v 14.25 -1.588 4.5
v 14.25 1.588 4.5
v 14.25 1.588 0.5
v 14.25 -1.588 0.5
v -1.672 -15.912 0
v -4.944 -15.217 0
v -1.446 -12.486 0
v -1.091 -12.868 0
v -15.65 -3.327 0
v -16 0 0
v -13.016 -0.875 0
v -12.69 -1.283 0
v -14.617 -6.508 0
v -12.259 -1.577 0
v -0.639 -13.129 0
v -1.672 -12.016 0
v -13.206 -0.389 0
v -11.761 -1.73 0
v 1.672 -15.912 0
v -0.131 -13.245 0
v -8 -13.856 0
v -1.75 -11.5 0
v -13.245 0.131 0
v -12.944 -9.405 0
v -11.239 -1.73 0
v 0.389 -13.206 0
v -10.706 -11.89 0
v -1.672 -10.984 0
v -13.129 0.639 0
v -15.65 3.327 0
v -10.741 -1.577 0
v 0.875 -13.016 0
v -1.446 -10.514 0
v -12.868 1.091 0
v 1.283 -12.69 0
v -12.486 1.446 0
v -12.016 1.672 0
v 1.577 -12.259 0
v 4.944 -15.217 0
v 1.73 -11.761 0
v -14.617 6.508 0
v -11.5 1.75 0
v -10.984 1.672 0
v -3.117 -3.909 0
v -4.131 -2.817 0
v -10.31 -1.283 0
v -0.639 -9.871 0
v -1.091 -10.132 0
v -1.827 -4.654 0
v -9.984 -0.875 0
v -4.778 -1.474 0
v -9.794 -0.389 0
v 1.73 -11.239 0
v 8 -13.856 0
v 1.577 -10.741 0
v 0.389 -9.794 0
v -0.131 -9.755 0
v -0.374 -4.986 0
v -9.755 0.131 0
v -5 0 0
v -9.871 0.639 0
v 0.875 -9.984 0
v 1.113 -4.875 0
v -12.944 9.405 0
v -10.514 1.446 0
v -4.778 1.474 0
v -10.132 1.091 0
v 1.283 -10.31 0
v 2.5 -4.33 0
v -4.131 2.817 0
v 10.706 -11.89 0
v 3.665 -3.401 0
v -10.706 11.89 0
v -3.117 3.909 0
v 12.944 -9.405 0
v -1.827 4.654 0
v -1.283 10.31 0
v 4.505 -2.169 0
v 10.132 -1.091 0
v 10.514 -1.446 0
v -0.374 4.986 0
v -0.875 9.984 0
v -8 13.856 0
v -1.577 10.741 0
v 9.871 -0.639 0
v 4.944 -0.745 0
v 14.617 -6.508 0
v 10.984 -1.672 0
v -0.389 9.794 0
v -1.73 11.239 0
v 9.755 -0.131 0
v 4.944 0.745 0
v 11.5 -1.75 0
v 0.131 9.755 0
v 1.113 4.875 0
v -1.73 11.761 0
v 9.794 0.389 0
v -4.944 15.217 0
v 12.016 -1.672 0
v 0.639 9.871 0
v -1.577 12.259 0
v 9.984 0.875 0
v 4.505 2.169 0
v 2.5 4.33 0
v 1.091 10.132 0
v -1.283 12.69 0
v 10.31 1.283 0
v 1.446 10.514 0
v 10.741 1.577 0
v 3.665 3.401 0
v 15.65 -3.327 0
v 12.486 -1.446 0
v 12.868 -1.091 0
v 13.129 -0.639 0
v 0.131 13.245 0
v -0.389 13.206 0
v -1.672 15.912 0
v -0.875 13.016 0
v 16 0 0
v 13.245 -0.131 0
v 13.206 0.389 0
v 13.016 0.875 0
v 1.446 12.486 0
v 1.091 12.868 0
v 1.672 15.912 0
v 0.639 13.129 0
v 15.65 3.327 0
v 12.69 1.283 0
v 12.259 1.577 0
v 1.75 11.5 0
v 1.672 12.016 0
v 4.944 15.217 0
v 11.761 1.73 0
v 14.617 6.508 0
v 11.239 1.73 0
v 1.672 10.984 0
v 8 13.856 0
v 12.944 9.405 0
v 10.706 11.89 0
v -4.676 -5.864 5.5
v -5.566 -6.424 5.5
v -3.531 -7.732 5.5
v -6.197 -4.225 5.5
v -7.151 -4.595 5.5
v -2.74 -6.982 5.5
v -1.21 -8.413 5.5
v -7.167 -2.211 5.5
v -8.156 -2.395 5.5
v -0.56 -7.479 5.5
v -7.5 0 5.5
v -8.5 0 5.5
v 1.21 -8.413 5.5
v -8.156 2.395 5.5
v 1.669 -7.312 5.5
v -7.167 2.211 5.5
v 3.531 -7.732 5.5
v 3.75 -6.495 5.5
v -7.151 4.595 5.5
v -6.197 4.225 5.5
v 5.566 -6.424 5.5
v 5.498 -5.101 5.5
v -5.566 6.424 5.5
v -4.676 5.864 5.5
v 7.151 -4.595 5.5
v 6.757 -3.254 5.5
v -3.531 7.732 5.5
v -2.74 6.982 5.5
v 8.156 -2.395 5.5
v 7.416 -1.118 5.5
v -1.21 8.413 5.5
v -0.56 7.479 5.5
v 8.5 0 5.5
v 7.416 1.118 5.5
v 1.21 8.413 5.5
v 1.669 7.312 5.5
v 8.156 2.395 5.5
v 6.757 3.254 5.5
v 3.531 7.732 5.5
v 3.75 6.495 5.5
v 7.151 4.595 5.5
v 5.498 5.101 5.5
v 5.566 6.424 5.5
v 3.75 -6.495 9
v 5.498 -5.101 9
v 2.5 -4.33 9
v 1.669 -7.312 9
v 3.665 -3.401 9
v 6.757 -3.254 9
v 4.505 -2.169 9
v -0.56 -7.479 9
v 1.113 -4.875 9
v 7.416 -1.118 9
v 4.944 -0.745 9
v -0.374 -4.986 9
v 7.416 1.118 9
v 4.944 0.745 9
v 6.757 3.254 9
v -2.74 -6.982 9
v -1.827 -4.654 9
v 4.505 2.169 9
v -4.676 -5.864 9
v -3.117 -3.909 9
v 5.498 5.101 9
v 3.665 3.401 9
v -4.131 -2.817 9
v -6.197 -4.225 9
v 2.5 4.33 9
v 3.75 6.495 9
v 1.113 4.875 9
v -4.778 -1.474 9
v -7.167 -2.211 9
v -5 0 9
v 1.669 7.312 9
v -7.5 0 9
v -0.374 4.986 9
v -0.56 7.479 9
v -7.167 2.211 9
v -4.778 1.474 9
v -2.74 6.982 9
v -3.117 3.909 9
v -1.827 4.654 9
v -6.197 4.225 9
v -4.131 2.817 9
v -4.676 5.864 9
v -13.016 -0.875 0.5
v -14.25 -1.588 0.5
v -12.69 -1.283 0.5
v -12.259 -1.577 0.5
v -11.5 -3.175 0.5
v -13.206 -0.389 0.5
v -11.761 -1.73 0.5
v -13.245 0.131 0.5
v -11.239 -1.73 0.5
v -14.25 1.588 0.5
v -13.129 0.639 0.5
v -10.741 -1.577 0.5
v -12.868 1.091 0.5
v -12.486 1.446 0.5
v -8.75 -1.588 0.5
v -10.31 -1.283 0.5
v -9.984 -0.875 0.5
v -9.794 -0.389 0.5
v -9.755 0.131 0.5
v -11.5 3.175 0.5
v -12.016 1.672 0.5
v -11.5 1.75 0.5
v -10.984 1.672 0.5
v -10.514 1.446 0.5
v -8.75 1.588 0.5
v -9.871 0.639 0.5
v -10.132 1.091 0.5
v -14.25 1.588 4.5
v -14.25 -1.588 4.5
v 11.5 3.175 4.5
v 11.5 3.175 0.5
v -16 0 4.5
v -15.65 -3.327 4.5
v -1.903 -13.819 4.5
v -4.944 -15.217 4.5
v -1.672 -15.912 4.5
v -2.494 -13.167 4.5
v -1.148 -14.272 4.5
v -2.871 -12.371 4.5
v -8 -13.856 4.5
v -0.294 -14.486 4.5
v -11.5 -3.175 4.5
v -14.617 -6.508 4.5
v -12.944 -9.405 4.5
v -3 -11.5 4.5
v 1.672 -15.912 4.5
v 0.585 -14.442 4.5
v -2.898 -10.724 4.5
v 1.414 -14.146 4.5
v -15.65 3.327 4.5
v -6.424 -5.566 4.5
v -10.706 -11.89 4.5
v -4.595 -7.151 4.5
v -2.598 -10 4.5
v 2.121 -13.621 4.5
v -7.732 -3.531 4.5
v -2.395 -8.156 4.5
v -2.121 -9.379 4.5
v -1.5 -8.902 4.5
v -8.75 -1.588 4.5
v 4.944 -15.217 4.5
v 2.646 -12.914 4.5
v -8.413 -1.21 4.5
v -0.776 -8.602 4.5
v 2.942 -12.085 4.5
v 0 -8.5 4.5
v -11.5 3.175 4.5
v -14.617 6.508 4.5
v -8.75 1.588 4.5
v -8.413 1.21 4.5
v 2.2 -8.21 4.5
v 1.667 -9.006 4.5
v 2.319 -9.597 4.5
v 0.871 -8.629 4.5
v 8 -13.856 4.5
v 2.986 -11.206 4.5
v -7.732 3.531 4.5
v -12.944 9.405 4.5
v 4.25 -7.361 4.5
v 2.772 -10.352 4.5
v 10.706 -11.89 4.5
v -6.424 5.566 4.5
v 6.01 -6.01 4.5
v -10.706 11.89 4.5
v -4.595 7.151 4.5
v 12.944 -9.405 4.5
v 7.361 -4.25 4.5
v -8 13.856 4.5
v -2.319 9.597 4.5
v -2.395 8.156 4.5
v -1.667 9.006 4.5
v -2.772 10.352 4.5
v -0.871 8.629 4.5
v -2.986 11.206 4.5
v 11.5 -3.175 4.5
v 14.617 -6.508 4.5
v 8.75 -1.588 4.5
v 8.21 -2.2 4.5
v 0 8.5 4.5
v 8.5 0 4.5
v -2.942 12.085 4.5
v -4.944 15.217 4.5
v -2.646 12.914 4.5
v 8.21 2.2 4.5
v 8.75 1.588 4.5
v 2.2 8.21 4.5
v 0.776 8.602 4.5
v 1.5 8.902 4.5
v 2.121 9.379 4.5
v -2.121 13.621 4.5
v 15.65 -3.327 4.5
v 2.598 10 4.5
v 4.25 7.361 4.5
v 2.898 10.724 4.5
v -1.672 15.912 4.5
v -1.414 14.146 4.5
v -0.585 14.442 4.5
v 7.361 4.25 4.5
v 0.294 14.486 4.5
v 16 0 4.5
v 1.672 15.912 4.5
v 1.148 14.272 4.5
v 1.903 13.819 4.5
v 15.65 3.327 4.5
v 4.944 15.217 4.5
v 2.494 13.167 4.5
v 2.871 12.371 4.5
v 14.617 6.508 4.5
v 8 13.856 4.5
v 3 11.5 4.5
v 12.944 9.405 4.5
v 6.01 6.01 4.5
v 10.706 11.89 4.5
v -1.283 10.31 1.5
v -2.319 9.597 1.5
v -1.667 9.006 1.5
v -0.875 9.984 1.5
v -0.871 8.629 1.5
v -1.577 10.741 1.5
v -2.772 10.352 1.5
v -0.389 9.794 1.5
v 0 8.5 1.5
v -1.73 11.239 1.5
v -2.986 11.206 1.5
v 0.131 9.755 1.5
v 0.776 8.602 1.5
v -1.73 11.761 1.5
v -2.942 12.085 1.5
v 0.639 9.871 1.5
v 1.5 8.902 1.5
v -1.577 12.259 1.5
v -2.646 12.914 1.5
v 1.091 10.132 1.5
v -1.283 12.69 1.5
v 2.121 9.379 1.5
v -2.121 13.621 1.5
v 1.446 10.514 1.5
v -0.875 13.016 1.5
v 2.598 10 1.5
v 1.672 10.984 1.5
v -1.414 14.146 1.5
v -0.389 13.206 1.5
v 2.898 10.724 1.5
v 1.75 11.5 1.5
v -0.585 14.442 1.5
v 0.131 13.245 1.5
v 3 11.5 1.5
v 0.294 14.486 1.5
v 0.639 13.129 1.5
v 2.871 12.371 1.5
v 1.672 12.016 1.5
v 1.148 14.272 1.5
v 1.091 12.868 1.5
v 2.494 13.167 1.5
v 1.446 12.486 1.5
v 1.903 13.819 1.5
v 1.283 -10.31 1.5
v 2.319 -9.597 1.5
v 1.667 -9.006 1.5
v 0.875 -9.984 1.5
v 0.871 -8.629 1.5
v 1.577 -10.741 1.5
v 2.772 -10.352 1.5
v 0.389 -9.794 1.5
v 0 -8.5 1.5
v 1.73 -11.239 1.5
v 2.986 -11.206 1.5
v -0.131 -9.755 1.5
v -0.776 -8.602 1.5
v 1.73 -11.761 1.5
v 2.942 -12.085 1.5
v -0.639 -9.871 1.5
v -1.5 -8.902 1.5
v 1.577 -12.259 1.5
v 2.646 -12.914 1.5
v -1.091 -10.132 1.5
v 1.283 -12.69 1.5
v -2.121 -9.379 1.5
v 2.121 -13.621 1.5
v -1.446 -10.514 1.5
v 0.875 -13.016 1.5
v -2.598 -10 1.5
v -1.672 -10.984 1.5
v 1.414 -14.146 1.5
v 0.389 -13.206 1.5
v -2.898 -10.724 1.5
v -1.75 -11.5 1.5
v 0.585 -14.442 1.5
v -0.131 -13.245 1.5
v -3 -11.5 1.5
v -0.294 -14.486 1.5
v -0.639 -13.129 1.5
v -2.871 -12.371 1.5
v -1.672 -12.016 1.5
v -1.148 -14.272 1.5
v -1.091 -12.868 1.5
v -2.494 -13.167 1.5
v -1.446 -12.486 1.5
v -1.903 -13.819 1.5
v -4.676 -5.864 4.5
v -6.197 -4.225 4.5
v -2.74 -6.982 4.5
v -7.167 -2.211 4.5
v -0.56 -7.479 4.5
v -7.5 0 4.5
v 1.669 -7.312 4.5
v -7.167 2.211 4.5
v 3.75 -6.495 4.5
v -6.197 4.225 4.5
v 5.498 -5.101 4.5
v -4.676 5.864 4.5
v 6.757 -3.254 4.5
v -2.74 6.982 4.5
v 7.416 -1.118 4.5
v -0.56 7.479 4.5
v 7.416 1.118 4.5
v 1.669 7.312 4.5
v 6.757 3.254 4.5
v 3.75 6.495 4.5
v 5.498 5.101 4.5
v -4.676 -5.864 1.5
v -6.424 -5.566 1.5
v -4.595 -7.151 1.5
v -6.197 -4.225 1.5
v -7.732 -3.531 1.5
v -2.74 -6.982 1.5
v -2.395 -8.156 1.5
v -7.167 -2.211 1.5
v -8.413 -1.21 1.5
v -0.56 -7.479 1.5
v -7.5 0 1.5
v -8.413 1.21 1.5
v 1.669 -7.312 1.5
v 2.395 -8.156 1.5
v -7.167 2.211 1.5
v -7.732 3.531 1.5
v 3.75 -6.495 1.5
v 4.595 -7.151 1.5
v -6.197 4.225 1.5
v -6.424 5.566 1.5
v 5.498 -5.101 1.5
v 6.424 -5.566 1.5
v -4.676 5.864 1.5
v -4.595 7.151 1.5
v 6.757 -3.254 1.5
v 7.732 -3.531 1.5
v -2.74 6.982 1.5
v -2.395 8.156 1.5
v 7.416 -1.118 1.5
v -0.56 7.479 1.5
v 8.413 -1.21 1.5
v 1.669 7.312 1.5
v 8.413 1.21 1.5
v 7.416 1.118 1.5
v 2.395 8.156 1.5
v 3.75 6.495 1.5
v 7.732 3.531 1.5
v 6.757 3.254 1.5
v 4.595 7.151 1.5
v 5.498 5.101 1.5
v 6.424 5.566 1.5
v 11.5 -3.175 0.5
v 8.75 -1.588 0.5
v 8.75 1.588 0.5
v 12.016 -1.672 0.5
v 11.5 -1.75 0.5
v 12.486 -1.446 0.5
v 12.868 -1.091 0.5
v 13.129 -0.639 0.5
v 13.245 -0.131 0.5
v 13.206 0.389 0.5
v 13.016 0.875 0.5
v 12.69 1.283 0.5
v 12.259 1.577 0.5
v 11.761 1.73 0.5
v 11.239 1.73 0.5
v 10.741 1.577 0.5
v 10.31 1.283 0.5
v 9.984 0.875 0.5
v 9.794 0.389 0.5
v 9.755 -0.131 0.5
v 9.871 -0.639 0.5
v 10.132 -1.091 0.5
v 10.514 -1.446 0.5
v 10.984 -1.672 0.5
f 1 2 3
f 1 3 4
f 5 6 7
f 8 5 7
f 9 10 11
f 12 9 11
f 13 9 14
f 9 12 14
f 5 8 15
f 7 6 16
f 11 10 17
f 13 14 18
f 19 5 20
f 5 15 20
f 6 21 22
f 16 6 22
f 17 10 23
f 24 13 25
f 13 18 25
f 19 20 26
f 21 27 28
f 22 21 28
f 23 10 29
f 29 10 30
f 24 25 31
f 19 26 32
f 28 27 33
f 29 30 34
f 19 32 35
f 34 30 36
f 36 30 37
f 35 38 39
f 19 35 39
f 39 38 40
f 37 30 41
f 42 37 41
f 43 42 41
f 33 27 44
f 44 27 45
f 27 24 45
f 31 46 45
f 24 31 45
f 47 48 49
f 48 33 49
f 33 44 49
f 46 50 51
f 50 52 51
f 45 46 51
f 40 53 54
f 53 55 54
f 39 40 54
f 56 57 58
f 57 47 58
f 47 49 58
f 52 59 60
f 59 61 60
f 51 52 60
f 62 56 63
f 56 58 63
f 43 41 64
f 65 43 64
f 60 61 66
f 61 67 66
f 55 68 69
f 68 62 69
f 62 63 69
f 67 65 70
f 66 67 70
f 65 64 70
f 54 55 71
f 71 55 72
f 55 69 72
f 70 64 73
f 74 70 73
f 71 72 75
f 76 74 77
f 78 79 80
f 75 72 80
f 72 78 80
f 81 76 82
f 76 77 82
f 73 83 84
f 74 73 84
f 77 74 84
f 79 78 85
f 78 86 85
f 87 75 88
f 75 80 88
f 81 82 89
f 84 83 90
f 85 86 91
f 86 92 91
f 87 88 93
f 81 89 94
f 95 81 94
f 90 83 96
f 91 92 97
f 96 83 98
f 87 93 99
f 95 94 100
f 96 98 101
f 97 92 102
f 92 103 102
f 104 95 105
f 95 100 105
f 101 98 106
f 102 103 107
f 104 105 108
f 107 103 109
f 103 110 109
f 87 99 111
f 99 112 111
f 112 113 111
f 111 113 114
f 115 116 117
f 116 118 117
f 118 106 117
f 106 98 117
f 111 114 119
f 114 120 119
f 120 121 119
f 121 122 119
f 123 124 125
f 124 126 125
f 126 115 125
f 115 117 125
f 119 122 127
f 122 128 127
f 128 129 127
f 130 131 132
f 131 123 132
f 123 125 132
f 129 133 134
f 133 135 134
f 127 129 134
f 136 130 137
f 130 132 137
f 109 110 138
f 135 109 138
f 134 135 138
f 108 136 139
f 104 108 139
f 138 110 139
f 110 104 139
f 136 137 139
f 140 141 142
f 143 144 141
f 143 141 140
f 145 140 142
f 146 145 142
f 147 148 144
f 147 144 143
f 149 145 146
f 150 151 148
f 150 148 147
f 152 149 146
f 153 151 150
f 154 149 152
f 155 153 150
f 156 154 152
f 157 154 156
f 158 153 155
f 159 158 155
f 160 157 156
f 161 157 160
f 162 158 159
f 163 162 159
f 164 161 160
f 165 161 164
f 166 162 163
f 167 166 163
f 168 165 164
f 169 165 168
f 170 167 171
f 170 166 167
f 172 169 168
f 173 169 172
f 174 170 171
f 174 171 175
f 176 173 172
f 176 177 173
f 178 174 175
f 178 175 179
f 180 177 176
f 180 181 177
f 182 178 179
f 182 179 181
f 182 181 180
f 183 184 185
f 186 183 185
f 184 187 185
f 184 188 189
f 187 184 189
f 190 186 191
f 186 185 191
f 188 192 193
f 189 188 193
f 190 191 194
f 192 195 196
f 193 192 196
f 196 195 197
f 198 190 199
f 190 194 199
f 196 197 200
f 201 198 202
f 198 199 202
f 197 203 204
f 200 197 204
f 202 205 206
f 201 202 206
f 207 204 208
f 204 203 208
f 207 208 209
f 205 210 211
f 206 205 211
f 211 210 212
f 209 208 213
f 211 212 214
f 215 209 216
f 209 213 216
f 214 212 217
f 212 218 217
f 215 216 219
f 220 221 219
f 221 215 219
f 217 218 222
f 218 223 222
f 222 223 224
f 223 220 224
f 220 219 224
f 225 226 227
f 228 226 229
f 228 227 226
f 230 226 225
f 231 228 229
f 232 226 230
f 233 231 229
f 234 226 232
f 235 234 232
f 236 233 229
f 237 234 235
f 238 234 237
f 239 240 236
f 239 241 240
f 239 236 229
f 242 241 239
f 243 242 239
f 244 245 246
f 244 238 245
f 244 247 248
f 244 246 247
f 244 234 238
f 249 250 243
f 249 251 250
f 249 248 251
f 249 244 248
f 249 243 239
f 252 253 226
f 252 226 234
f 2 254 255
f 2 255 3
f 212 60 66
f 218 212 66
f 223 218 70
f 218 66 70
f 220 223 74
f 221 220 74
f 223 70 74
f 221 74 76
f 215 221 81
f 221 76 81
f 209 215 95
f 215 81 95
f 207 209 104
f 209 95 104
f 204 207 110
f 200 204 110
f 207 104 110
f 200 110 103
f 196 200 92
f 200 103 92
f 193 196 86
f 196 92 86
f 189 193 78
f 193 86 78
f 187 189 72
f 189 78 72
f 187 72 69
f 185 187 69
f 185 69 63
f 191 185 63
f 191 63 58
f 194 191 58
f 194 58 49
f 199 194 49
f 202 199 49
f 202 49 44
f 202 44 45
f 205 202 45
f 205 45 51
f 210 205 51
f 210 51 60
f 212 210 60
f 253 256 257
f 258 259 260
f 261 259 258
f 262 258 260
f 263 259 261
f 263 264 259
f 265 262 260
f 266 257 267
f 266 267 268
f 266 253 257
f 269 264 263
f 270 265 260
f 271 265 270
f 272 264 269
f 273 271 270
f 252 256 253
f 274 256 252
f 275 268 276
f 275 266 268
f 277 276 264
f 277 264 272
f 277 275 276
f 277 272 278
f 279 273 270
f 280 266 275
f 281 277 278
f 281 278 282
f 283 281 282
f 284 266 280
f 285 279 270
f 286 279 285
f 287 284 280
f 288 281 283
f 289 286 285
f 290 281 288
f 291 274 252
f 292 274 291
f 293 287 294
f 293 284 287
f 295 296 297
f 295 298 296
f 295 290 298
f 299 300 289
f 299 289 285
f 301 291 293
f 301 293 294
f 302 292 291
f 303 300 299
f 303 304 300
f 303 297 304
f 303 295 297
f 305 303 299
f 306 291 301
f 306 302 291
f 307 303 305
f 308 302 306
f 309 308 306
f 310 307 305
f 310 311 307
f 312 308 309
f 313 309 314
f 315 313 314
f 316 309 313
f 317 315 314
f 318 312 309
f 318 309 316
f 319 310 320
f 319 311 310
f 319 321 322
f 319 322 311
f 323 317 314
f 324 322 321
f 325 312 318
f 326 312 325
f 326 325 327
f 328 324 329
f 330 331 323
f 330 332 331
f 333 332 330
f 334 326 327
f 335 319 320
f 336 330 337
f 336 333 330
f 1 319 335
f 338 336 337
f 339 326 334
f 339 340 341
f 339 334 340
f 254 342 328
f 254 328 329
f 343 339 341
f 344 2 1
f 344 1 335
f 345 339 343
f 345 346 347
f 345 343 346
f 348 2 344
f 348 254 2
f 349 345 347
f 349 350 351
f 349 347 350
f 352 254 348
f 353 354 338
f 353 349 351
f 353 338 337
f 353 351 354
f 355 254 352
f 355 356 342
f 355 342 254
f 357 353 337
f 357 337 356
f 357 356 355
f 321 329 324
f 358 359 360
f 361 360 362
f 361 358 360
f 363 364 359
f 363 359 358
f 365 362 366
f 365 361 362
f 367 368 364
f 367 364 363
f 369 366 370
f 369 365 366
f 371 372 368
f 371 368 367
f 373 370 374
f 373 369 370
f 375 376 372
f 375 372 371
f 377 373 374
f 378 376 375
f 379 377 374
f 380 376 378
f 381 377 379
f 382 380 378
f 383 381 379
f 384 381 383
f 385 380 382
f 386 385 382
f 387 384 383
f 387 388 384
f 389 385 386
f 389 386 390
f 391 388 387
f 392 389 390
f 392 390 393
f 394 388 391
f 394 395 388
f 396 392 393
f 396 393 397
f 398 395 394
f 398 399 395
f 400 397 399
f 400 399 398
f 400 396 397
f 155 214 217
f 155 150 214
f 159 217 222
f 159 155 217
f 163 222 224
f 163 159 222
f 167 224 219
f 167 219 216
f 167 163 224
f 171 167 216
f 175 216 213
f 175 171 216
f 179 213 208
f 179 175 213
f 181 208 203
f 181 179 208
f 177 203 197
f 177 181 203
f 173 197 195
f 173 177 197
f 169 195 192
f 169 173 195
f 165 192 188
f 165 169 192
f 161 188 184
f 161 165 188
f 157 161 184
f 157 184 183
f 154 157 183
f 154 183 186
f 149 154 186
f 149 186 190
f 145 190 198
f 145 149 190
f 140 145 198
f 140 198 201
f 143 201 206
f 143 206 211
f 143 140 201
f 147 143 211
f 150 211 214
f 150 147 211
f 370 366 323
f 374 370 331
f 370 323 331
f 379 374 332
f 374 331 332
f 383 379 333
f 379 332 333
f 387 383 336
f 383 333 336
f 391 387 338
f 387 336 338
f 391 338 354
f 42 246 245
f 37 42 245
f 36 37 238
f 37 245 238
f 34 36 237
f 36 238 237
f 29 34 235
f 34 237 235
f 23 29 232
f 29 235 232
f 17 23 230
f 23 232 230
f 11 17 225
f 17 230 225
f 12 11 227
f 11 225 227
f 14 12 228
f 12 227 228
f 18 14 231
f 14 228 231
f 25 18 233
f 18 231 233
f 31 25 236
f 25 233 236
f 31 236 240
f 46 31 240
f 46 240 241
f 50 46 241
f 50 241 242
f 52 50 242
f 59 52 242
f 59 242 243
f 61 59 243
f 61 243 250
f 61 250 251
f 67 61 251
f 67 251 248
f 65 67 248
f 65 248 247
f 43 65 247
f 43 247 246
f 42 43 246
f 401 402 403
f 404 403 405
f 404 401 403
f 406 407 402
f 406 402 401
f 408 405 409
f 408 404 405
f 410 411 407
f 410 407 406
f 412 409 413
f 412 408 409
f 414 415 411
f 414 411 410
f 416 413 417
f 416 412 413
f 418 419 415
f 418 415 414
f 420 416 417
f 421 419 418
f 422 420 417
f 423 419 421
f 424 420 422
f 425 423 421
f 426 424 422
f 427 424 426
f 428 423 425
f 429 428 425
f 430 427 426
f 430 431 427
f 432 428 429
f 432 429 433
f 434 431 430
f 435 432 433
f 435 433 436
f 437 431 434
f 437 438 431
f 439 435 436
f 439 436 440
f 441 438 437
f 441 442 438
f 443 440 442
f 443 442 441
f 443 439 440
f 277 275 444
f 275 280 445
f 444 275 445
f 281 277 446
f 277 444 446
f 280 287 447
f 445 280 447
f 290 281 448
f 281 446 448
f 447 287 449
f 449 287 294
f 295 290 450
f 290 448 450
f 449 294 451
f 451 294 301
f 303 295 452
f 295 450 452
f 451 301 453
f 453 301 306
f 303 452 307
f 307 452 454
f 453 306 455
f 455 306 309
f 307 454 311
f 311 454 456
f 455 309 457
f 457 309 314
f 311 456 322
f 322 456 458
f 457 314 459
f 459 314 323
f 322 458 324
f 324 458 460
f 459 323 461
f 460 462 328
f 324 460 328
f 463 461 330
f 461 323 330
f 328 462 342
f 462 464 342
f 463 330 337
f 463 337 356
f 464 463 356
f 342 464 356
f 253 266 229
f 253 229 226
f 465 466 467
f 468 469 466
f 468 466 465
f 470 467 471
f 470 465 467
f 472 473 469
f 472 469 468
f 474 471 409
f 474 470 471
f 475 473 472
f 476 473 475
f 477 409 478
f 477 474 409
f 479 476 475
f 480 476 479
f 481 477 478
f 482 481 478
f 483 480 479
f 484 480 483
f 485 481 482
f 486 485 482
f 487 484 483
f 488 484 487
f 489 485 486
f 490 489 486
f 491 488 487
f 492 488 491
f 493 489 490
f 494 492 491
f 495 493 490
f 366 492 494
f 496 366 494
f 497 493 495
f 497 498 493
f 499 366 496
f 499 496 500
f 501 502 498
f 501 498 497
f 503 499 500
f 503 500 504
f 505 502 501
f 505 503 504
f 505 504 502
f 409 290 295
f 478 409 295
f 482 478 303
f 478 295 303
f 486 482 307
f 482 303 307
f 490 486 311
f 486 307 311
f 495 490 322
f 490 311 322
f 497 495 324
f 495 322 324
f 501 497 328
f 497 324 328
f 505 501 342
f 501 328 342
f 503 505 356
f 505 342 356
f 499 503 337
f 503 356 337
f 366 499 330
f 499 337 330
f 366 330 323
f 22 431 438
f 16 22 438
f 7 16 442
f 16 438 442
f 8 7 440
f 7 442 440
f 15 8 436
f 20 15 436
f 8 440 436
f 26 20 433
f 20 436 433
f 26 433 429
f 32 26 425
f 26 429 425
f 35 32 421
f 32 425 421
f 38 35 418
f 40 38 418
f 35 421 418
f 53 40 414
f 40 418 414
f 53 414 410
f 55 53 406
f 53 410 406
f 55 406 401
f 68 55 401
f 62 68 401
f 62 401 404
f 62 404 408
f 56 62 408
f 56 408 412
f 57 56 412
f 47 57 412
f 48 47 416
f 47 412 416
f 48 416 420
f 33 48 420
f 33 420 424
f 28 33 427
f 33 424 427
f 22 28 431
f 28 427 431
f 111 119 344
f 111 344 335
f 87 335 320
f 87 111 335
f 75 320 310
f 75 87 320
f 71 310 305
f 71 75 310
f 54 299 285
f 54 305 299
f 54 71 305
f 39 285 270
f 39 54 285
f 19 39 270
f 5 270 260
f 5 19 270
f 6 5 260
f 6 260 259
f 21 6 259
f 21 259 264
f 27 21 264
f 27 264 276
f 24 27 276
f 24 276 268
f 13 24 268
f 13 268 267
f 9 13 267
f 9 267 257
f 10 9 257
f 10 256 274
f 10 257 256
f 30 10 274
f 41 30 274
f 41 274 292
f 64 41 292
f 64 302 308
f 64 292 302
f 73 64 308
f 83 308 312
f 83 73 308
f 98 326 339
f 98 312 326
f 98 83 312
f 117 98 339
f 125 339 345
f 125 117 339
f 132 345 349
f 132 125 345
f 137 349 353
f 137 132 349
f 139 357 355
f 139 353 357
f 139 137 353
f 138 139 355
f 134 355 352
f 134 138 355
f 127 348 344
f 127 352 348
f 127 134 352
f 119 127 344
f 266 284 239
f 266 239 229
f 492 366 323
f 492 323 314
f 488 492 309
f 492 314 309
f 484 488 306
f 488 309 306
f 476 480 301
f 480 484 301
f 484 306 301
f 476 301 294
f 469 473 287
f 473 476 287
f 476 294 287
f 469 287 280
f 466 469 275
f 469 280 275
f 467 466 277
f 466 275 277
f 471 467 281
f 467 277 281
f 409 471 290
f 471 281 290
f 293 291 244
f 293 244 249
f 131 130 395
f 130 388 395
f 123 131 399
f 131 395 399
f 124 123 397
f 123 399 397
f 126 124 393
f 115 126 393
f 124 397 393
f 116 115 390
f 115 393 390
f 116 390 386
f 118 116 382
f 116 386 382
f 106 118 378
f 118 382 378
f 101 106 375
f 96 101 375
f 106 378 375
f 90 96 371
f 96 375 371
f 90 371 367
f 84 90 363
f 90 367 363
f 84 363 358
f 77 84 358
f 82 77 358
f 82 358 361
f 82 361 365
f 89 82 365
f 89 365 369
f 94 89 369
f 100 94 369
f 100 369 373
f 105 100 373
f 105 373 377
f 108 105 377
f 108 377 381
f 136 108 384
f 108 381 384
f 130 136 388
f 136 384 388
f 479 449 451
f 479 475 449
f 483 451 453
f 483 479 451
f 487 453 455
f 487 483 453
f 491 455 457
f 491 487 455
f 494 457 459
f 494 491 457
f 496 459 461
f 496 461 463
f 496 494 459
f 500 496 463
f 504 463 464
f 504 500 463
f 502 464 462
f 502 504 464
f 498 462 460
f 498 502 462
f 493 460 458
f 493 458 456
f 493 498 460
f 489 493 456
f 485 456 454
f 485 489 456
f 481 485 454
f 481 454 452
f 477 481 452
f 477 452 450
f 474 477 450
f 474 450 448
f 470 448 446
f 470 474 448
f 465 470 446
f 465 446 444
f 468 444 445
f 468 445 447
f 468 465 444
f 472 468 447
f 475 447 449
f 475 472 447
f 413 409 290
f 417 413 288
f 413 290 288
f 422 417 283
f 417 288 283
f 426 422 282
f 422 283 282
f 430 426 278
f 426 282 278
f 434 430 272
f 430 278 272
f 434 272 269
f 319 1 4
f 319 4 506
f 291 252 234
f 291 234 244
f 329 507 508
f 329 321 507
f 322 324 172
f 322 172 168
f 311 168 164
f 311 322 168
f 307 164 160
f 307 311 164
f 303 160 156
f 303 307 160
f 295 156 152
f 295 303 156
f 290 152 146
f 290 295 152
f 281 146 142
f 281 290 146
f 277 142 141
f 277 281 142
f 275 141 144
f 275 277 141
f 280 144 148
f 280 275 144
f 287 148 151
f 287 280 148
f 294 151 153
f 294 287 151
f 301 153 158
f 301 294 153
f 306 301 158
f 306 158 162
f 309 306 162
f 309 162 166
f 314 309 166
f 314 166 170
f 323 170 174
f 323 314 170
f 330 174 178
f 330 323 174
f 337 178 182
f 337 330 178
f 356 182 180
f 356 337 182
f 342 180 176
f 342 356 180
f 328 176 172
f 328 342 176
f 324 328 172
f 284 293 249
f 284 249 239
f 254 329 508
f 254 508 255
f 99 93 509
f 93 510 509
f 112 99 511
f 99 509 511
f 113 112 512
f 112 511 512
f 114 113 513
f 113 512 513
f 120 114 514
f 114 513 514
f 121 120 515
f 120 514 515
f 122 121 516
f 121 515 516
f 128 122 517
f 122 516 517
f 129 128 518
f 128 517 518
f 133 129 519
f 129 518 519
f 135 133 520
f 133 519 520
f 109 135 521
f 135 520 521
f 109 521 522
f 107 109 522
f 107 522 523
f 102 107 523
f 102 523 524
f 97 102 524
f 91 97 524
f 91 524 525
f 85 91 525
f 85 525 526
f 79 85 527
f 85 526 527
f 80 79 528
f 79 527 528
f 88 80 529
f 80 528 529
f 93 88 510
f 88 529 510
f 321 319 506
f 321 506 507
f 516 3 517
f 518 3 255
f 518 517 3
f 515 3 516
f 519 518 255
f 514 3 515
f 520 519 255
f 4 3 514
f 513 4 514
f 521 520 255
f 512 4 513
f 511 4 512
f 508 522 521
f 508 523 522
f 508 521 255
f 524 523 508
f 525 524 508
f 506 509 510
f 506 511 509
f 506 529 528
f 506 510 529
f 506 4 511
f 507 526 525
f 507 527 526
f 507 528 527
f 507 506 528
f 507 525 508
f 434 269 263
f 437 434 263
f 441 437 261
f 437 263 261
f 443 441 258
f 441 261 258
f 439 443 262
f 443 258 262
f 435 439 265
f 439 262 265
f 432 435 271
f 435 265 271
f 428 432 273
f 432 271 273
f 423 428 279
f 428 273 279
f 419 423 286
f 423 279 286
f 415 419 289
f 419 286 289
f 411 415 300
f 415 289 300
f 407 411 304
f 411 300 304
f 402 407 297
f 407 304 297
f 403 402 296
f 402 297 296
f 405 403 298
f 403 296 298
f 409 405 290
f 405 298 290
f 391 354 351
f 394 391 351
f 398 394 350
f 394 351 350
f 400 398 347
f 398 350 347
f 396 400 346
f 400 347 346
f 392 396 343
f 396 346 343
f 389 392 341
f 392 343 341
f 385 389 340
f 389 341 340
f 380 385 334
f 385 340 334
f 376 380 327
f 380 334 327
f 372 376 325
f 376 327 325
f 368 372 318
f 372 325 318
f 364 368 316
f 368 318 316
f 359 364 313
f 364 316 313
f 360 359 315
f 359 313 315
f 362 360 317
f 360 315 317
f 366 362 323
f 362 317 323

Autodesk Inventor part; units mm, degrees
ref_plane "YZ Plane" through (0, 0, 0) normal (1, 0, 0) x (0, 1, 0)
ref_plane "XZ Plane" through (0, 0, 0) normal (0, 1, 0) x (-1, 0, 0)
ref_plane "XY Plane" through (0, 0, 0) normal (0, 0, 1) x (1, 0, 0)
sketch "Sketch1" plane through (0, 0, 0) normal (0, 0, 1) x (1, 0, 0)
  circle A0 centre (0, 0) radius 16
  dimension "d0" = 32
extrude "Extrusion1" add sketch "Sketch1" along normal blind 4.5
sketch "Sketch2" plane through (0, 0, 4.5) normal (0, 0, 1) x (1, 0, 0)
  circle A0 centre (0, 0) radius 16 projected
  circle A1 centre (0, 0) radius 8.5
  dimension "d5" = 17
extrude "Extrusion2" add sketch "Sketch2" along normal blind 1 contours A1
sketch "Sketch3" plane through (0, 0, 5.5) normal (0, 0, 1) x (1, 0, 0)
  circle A0 centre (0, 0) radius 8.5 projected
  circle A1 centre (0, 0) radius 7.5
  dimension "d10" = 15
extrude "Extrusion3" cut sketch "Sketch3" against normal through all contours A1
sketch "Sketch4" plane through (0, 0, 4.5) normal (0, 0, 1) x (1, 0, 0)
  circle A0 centre (0, 0) radius 8.5 projected
  circle A1 centre (0, 11.5) radius 1.75
  circle A2 centre (0, 11.5) radius 3
  dimension "d15" = 11.5
  dimension "d16" = 3.5
  dimension "d41" = 6
extrude "Extrusion4" cut sketch "Sketch4" against normal through all contours A1
pattern_circular "Circular Pattern1" count 4 over 360 about axis through (0, 0, 0) along (0, 0, 1) of "Extrusion4"
sketch "Sketch5" plane through (0, 0, 4.5) normal (0, 0, 1) x (1, 0, 0)
  circle A0 centre (0, 11.5) radius 1.75 projected
  circle A1 centre (0, 0) radius 8.5 projected
  arc A2 (0, 8.5) -> (0, 8.5) centre (0, 11.5) ccw
  circle A3 centre (0, 11.5) radius 3
  dimension "d22" = 6
  dimension "d40" = 6
extrude "Extrusion5" cut sketch "Sketch5" against normal blind 3
sketch "Sketch6" plane through (0, 0, 4.5) normal (0, 0, 1) x (1, 0, 0)
  circle A0 centre (-11.5, 0) radius 1.75 projected
  line L0 (-11.5, 3.1754) -> (-8.75, 1.5877)
  line L1 (-8.75, 1.5877) -> (-8.75, -1.5877)
  line L2 (-8.75, -1.5877) -> (-11.5, -3.1754)
  line L3 (-11.5, -3.1754) -> (-14.25, -1.5877)
  line L4 (-14.25, -1.5877) -> (-14.25, 1.5877)
  line L5 (-14.25, 1.5877) -> (-11.5, 3.1754)
  dimension "d28" = 5.5
extrude "Extrusion6" cut sketch "Sketch6" against normal blind 4
pattern_circular "Circular Pattern2" count 2 over 360 about axis through (0, 0, 0) along (0, 0, 1) of "Extrusion6", "Extrusion5"
sketch "Sketch7" plane through (0, 0, 0) normal (0, 0, -1) x (-1, 0, 0)
  circle A0 centre (0, 0) radius 7.5 projected
  circle A1 centre (0, 0) radius 16 projected
  circle A2 centre (0, 0) radius 5
  dimension "d34" = 10
extrude "Extrusion7" add sketch "Sketch7" against normal blind 9 contours A0
properties part number "bearing seat 2"
